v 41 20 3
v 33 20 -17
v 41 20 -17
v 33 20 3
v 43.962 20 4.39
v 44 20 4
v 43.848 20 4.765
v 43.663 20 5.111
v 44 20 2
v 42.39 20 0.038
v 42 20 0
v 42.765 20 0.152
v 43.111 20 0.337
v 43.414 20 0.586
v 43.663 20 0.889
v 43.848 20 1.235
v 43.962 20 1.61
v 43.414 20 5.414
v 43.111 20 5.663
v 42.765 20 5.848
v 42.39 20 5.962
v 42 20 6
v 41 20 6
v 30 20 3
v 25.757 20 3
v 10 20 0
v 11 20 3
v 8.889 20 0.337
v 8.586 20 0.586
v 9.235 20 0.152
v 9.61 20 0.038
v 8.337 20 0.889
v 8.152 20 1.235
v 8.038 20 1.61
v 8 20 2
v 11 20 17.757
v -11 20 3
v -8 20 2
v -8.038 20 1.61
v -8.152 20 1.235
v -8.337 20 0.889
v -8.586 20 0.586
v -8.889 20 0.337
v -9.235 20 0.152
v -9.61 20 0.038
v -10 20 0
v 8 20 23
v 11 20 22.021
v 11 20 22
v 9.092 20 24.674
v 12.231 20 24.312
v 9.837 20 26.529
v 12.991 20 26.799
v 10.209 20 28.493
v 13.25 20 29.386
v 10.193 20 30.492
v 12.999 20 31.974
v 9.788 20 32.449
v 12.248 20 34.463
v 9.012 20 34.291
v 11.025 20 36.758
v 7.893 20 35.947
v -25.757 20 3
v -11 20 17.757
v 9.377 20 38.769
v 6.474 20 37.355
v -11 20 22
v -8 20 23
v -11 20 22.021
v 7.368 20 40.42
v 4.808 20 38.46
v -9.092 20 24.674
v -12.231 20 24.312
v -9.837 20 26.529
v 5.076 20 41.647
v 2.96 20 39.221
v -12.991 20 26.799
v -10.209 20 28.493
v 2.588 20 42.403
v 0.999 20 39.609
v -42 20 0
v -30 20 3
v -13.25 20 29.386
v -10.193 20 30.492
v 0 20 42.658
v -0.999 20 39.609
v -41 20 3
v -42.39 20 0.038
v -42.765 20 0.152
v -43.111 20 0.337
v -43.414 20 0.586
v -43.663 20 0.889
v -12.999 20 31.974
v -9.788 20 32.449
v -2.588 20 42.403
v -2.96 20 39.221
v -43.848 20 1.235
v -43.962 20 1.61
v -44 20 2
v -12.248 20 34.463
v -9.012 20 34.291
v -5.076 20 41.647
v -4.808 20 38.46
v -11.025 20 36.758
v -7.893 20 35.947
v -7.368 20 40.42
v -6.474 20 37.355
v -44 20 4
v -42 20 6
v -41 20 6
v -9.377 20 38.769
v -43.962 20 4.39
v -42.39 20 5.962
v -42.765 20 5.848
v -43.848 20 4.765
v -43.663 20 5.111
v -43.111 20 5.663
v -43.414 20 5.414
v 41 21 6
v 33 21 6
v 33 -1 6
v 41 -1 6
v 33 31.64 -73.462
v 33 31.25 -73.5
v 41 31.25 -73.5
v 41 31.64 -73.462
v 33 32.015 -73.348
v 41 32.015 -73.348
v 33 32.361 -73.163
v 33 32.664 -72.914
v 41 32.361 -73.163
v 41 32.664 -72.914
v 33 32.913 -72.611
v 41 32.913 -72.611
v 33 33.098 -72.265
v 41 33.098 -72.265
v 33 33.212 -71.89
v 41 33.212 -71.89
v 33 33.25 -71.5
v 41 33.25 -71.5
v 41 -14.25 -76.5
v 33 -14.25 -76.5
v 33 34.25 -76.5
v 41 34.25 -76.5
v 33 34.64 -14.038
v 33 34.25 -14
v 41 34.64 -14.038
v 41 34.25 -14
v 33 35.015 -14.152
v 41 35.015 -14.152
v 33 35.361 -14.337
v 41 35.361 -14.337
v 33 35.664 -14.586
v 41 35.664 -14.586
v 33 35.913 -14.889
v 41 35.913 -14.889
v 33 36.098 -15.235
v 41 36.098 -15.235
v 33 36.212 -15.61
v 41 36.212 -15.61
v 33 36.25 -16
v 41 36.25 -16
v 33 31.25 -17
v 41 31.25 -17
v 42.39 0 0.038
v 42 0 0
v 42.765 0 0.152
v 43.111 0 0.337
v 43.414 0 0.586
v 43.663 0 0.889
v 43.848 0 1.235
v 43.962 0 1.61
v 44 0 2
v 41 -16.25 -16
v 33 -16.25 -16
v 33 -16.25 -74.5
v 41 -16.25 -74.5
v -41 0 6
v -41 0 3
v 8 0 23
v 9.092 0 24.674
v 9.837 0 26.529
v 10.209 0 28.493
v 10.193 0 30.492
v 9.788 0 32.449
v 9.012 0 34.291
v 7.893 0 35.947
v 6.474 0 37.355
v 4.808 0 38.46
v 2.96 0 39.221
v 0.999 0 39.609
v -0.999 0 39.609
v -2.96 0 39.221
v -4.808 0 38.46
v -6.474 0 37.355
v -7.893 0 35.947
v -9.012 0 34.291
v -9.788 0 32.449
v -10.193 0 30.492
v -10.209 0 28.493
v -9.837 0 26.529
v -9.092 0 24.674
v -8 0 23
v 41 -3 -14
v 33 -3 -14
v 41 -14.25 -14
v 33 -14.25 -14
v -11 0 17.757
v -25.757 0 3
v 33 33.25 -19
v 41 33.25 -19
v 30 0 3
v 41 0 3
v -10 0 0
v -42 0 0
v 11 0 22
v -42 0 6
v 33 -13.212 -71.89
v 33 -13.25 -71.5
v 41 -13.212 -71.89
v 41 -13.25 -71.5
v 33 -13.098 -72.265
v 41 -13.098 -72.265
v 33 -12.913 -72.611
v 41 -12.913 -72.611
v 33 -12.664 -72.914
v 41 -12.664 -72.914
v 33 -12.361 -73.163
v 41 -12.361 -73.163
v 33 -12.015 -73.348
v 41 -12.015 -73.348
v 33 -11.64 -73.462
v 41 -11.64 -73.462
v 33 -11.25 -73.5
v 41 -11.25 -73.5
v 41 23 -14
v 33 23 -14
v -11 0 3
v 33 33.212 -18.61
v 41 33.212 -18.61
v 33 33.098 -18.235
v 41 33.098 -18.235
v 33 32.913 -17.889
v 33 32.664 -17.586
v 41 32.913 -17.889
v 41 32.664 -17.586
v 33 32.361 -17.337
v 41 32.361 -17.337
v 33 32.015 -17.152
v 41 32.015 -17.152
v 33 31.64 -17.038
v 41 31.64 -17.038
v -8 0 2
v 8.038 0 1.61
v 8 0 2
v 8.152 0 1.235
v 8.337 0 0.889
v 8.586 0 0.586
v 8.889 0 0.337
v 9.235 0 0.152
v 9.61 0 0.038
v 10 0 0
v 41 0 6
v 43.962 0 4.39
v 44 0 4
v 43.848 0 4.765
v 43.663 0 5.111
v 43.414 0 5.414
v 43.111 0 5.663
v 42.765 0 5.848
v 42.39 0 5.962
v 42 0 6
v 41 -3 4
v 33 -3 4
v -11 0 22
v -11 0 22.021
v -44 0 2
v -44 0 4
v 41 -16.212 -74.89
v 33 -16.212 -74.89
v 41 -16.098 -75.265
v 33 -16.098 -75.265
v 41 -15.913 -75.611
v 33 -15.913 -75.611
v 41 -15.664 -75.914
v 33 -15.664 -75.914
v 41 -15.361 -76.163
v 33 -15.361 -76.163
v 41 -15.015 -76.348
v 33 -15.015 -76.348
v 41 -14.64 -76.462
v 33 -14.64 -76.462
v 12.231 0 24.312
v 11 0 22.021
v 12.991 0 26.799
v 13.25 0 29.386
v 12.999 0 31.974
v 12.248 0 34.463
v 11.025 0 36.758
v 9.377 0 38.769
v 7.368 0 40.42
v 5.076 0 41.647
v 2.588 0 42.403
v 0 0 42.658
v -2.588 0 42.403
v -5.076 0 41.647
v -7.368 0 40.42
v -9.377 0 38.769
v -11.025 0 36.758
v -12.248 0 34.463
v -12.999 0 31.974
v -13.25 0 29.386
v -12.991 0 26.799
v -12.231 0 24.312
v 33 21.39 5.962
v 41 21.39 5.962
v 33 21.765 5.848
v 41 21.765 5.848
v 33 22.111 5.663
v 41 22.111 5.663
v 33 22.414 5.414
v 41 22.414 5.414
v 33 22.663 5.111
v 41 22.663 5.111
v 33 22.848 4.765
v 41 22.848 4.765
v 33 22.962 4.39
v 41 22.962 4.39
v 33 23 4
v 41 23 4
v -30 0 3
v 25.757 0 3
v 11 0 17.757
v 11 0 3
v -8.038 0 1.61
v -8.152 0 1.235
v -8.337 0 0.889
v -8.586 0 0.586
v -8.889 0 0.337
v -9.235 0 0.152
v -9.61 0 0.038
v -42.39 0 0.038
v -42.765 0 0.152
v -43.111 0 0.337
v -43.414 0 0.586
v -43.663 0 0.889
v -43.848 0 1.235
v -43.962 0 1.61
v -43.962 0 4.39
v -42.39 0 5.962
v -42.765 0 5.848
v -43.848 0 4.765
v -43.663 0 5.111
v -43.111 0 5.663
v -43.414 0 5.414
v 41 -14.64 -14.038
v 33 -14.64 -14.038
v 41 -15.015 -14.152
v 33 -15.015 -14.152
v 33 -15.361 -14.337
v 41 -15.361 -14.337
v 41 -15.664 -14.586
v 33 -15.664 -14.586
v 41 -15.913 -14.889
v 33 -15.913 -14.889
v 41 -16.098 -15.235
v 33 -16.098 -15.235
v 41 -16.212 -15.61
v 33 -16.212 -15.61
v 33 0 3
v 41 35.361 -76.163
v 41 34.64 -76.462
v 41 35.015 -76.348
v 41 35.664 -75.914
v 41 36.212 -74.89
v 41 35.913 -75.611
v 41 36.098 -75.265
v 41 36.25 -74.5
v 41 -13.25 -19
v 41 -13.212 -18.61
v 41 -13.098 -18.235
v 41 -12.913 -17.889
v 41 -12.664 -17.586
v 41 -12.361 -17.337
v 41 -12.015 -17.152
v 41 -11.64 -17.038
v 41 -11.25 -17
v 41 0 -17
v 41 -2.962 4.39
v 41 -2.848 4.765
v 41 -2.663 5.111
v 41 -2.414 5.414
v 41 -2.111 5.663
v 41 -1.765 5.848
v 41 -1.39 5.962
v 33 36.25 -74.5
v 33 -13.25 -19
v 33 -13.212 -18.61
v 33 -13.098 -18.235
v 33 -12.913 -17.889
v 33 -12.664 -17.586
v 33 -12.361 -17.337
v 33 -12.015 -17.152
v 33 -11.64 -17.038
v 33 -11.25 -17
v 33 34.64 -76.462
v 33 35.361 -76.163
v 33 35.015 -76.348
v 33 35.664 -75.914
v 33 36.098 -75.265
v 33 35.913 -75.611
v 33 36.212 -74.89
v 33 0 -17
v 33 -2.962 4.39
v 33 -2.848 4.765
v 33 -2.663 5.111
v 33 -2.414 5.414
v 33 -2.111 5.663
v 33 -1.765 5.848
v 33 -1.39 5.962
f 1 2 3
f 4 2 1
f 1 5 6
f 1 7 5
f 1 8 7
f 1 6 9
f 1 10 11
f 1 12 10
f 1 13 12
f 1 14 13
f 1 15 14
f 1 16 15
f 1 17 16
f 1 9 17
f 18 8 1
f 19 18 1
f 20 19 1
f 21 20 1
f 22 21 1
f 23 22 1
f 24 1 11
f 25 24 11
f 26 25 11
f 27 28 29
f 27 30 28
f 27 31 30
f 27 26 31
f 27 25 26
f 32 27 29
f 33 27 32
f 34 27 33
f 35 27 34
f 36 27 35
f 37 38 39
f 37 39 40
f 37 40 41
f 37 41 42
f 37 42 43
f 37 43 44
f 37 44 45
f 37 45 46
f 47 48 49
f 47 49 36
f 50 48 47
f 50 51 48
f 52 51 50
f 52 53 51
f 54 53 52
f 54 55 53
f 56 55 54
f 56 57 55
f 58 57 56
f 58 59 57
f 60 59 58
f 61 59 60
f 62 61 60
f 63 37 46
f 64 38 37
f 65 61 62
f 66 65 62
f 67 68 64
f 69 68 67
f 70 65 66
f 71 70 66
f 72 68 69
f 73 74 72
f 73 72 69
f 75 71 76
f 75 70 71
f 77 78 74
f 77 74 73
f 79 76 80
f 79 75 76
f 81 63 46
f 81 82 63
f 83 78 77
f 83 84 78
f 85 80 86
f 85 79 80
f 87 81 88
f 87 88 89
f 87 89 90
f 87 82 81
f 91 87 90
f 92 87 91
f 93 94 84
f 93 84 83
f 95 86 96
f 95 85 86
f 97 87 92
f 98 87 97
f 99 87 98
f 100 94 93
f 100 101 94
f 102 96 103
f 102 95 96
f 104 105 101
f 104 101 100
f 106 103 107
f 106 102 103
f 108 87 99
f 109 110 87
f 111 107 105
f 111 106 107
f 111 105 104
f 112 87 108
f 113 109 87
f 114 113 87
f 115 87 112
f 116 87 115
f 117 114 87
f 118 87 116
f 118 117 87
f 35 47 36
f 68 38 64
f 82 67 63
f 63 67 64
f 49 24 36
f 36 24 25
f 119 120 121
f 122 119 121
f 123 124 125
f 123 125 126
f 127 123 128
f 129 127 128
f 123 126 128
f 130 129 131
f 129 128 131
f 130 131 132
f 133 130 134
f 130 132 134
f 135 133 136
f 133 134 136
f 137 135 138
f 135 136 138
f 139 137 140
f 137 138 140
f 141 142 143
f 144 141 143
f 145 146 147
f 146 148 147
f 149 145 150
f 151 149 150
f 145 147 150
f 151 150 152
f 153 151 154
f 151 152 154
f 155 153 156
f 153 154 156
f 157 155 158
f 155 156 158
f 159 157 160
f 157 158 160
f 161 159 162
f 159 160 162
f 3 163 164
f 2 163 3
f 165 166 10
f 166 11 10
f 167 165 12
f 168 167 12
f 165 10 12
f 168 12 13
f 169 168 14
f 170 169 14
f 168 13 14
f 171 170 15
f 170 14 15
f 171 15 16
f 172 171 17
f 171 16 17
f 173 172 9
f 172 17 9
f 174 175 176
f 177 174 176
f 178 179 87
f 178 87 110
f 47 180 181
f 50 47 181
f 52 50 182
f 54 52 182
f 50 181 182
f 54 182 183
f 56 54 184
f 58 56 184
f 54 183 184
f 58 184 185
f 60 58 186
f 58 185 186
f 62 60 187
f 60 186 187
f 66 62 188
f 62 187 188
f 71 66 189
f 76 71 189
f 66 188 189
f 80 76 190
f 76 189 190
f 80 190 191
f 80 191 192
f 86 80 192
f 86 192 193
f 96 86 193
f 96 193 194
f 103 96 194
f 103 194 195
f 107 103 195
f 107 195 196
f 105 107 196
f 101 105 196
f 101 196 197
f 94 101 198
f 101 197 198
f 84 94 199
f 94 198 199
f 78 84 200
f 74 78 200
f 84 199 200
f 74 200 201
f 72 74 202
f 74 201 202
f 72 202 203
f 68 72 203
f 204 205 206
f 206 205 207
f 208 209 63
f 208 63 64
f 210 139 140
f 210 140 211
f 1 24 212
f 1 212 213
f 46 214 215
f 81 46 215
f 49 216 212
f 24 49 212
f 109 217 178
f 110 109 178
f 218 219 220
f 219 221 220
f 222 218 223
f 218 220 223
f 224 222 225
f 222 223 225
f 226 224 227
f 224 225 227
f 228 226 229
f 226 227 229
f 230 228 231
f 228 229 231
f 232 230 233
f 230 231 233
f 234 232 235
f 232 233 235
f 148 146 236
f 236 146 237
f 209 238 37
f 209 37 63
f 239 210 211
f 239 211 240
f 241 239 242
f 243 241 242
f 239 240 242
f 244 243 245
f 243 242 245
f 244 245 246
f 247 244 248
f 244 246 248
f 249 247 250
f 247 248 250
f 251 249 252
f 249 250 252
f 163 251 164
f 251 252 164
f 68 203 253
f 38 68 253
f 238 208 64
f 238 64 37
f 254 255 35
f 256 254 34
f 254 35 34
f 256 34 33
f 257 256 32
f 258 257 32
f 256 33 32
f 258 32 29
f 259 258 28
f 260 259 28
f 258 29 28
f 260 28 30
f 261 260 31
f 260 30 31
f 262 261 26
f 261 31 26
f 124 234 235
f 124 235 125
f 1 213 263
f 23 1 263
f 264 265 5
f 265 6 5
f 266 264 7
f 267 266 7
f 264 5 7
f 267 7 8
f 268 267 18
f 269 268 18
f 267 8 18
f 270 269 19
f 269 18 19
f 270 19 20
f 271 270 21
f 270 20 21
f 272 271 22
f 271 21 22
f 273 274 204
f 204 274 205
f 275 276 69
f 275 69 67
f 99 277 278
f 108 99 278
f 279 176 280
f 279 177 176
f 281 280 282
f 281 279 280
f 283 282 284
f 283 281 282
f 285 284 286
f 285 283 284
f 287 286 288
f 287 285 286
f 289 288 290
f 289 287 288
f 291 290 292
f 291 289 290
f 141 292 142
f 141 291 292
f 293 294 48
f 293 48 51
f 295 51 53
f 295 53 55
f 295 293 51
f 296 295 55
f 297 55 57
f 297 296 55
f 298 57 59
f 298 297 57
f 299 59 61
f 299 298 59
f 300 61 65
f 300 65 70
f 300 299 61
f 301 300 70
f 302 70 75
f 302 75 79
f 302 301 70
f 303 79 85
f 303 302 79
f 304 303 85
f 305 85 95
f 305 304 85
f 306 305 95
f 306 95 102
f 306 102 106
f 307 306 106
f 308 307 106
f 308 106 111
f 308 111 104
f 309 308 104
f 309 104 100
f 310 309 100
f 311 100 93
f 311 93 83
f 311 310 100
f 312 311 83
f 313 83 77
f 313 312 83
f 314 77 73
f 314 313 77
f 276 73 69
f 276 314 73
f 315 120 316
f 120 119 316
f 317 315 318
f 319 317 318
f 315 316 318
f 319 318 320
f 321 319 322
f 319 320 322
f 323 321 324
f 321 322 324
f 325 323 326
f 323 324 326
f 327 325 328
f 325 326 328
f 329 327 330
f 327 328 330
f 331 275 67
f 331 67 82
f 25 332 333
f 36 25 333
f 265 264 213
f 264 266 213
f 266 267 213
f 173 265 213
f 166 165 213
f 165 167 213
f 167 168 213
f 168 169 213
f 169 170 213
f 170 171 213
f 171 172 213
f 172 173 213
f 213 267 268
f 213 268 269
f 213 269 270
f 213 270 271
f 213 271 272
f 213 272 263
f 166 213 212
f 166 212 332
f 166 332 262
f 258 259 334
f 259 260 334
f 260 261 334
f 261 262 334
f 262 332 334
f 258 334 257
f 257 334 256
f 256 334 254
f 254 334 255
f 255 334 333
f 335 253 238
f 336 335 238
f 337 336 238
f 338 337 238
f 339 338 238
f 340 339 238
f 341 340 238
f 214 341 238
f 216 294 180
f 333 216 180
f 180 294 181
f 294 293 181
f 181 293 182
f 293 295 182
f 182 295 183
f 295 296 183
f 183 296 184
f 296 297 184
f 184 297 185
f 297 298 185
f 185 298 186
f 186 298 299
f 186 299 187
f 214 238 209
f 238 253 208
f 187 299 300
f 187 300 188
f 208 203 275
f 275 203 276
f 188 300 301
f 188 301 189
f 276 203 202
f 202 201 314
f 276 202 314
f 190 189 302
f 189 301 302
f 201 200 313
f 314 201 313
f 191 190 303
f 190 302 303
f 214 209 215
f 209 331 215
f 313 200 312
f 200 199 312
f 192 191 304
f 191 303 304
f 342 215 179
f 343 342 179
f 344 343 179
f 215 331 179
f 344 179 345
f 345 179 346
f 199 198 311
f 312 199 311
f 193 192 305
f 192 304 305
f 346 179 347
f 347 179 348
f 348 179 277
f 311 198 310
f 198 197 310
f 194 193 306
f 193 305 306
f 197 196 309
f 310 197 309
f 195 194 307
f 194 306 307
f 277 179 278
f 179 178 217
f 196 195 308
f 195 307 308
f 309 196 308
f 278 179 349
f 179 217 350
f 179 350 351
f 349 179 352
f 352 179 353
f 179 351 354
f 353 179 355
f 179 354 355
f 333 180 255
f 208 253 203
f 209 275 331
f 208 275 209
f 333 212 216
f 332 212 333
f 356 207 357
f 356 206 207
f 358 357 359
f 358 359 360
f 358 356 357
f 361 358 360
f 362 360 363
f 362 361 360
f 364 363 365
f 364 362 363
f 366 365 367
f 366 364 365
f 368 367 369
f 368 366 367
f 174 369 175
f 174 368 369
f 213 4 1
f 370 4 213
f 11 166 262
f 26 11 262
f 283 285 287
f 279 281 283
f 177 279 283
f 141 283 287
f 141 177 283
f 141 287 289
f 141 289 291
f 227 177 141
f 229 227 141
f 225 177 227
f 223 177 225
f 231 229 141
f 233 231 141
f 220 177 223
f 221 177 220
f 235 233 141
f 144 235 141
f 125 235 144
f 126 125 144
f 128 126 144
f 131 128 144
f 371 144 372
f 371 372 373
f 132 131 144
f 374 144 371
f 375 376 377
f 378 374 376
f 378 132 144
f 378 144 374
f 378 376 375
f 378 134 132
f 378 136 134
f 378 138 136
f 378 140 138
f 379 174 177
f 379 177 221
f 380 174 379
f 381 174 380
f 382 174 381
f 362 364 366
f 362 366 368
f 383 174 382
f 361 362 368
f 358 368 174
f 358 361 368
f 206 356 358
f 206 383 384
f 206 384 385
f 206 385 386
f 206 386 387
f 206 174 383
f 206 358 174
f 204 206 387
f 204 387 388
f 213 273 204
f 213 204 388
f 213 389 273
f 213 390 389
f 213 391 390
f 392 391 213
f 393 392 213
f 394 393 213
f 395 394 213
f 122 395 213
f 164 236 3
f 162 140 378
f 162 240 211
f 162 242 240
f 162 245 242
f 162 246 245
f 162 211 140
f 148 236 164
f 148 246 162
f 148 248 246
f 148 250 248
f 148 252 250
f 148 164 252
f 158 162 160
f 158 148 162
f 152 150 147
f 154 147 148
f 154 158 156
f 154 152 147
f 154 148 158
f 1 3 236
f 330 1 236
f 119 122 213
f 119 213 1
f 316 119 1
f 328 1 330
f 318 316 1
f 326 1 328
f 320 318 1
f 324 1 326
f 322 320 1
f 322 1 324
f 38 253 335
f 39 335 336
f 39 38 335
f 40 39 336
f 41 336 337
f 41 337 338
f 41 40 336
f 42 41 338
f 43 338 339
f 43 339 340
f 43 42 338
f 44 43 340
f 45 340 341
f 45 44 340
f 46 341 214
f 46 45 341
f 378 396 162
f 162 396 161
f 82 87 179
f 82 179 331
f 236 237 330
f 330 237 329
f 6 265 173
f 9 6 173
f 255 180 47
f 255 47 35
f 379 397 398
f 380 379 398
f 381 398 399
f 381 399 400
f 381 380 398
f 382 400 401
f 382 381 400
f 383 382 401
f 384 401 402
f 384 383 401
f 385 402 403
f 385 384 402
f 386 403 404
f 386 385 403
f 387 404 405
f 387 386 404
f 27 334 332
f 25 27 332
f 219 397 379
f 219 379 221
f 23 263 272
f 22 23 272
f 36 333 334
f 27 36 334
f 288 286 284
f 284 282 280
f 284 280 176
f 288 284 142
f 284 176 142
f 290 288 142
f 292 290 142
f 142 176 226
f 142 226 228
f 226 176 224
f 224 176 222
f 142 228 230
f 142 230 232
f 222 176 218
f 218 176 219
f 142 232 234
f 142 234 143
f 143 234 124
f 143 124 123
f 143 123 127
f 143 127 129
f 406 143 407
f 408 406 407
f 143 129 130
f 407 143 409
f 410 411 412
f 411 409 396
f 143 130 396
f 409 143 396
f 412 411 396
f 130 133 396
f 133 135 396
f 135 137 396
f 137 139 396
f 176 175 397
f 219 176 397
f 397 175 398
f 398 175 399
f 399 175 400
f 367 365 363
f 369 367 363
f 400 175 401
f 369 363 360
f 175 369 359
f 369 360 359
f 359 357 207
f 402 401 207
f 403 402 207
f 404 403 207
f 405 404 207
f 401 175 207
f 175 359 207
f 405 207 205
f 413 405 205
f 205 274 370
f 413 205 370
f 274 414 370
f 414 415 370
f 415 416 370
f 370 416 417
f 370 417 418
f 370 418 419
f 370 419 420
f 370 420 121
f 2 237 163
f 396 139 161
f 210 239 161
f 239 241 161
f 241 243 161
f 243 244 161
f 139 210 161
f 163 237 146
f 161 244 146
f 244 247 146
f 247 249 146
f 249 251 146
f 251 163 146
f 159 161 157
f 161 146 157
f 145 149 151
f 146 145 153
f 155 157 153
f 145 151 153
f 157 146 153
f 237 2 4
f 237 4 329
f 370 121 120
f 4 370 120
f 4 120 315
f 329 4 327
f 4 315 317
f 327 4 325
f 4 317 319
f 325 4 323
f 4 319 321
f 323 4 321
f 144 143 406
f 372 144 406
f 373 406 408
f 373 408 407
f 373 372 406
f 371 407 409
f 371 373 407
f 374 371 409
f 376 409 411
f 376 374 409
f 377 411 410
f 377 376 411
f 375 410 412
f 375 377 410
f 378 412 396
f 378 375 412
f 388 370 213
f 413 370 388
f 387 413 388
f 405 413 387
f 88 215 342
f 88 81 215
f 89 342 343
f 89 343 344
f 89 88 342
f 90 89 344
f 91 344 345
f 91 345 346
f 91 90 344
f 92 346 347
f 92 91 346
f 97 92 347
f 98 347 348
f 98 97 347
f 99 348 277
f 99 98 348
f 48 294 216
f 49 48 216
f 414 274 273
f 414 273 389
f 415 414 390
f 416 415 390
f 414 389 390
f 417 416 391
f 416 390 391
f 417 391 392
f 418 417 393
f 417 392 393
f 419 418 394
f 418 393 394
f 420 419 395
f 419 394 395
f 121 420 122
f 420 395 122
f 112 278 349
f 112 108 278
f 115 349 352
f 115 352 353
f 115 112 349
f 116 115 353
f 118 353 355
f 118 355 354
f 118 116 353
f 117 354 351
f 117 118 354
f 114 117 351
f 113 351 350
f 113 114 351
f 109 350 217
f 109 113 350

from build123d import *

# Parameters (mm, degrees)
PAD_DEPTH    = 20
FILLET001_R  = 2
PAD001_DEPTH = 8
FILLET_R     = 2


with BuildPart() as shower_mount:
    # Sketch → Pad (new body)
    with BuildSketch(Plane.XZ):
        with BuildLine():
            ThreePointArc((8, 23), (0, 39.658003), (-8, 23))
            Line((-8, 23), (-8, 3))
            Line((-8, 3), (-8, 0))
            Line((-8, 0), (-44, 0))
            Line((-44, 0), (-44, 6))
            Line((-44, 6), (-41, 6))
            Line((-41, 3), (-41, 6))
            Line((-41, 3), (-30, 3))
            Line((-11, 22), (-30, 3))
            Line((-11, 22.021359), (-11, 22))
            ThreePointArc((11, 22.021359), (0, 42.658003), (-11, 22.021359))
            Line((11, 22.021359), (11, 22))
            Line((11, 22), (30, 3))
            Line((30, 3), (41, 3))
            Line((41, 3), (41, 6))
            Line((41, 6), (44, 6))
            Line((44, 6), (44, 0))
            Line((44, 0), (8, 0))
            Line((8, 3), (8, 0))
            Line((8, 23), (8, 3))
        make_face()
        Polygon((-11, 3), (-25.757359, 3), (-11, 17.757359), align=None, mode=Mode.SUBTRACT)
        Polygon((11, 3), (25.757359, 3), (11, 17.757359), align=None, mode=Mode.SUBTRACT)
    extrude(amount=-PAD_DEPTH)

    # Fillet001
    fillet001_edges = [shower_mount.edges().sort_by_distance(p)[0] for p in [
        (44, 10, 0),
        (-44, 10, 0),
        (-8, 10, 0),
        (8, 10, 0),
        (-44, 10, 6),
        (44, 10, 6),
    ]]
    fillet(fillet001_edges, radius=FILLET001_R)


with BuildPart() as speaker_mount_bracket:
    # Sketch001 → Pad001 (new body)
    with BuildSketch(Plane.YZ.offset(33)):
        Polygon((-3, 6), (-3, -14), (-16.25, -14), (-16.25, -76.5), (36.25, -76.5), (36.25, -14), (23, -14), (23, 6), align=None)
        Polygon((-13.25, -17), (-13.25, -73.5), (33.25, -73.5), (33.25, -17), (20, -17), (20, 3), (0, 3), (0, -17), align=None, mode=Mode.SUBTRACT)
    extrude(amount=PAD001_DEPTH)

    # Fillet
    fillet_edges = [speaker_mount_bracket.edges().sort_by_distance(p)[0] for p in [
        (37, -13.25, -17),
        (37, -16.25, -14),
        (37, 33.25, -17),
        (37, 36.25, -14),
        (37, -16.25, -76.5),
        (37, -13.25, -73.5),
        (37, 33.25, -73.5),
        (37, 36.25, -76.5),
        (37, 23, 6),
        (37, -3, 6),
    ]]
    fillet(fillet_edges, radius=FILLET_R)


solid = Compound([shower_mount.part, speaker_mount_bracket.part])
